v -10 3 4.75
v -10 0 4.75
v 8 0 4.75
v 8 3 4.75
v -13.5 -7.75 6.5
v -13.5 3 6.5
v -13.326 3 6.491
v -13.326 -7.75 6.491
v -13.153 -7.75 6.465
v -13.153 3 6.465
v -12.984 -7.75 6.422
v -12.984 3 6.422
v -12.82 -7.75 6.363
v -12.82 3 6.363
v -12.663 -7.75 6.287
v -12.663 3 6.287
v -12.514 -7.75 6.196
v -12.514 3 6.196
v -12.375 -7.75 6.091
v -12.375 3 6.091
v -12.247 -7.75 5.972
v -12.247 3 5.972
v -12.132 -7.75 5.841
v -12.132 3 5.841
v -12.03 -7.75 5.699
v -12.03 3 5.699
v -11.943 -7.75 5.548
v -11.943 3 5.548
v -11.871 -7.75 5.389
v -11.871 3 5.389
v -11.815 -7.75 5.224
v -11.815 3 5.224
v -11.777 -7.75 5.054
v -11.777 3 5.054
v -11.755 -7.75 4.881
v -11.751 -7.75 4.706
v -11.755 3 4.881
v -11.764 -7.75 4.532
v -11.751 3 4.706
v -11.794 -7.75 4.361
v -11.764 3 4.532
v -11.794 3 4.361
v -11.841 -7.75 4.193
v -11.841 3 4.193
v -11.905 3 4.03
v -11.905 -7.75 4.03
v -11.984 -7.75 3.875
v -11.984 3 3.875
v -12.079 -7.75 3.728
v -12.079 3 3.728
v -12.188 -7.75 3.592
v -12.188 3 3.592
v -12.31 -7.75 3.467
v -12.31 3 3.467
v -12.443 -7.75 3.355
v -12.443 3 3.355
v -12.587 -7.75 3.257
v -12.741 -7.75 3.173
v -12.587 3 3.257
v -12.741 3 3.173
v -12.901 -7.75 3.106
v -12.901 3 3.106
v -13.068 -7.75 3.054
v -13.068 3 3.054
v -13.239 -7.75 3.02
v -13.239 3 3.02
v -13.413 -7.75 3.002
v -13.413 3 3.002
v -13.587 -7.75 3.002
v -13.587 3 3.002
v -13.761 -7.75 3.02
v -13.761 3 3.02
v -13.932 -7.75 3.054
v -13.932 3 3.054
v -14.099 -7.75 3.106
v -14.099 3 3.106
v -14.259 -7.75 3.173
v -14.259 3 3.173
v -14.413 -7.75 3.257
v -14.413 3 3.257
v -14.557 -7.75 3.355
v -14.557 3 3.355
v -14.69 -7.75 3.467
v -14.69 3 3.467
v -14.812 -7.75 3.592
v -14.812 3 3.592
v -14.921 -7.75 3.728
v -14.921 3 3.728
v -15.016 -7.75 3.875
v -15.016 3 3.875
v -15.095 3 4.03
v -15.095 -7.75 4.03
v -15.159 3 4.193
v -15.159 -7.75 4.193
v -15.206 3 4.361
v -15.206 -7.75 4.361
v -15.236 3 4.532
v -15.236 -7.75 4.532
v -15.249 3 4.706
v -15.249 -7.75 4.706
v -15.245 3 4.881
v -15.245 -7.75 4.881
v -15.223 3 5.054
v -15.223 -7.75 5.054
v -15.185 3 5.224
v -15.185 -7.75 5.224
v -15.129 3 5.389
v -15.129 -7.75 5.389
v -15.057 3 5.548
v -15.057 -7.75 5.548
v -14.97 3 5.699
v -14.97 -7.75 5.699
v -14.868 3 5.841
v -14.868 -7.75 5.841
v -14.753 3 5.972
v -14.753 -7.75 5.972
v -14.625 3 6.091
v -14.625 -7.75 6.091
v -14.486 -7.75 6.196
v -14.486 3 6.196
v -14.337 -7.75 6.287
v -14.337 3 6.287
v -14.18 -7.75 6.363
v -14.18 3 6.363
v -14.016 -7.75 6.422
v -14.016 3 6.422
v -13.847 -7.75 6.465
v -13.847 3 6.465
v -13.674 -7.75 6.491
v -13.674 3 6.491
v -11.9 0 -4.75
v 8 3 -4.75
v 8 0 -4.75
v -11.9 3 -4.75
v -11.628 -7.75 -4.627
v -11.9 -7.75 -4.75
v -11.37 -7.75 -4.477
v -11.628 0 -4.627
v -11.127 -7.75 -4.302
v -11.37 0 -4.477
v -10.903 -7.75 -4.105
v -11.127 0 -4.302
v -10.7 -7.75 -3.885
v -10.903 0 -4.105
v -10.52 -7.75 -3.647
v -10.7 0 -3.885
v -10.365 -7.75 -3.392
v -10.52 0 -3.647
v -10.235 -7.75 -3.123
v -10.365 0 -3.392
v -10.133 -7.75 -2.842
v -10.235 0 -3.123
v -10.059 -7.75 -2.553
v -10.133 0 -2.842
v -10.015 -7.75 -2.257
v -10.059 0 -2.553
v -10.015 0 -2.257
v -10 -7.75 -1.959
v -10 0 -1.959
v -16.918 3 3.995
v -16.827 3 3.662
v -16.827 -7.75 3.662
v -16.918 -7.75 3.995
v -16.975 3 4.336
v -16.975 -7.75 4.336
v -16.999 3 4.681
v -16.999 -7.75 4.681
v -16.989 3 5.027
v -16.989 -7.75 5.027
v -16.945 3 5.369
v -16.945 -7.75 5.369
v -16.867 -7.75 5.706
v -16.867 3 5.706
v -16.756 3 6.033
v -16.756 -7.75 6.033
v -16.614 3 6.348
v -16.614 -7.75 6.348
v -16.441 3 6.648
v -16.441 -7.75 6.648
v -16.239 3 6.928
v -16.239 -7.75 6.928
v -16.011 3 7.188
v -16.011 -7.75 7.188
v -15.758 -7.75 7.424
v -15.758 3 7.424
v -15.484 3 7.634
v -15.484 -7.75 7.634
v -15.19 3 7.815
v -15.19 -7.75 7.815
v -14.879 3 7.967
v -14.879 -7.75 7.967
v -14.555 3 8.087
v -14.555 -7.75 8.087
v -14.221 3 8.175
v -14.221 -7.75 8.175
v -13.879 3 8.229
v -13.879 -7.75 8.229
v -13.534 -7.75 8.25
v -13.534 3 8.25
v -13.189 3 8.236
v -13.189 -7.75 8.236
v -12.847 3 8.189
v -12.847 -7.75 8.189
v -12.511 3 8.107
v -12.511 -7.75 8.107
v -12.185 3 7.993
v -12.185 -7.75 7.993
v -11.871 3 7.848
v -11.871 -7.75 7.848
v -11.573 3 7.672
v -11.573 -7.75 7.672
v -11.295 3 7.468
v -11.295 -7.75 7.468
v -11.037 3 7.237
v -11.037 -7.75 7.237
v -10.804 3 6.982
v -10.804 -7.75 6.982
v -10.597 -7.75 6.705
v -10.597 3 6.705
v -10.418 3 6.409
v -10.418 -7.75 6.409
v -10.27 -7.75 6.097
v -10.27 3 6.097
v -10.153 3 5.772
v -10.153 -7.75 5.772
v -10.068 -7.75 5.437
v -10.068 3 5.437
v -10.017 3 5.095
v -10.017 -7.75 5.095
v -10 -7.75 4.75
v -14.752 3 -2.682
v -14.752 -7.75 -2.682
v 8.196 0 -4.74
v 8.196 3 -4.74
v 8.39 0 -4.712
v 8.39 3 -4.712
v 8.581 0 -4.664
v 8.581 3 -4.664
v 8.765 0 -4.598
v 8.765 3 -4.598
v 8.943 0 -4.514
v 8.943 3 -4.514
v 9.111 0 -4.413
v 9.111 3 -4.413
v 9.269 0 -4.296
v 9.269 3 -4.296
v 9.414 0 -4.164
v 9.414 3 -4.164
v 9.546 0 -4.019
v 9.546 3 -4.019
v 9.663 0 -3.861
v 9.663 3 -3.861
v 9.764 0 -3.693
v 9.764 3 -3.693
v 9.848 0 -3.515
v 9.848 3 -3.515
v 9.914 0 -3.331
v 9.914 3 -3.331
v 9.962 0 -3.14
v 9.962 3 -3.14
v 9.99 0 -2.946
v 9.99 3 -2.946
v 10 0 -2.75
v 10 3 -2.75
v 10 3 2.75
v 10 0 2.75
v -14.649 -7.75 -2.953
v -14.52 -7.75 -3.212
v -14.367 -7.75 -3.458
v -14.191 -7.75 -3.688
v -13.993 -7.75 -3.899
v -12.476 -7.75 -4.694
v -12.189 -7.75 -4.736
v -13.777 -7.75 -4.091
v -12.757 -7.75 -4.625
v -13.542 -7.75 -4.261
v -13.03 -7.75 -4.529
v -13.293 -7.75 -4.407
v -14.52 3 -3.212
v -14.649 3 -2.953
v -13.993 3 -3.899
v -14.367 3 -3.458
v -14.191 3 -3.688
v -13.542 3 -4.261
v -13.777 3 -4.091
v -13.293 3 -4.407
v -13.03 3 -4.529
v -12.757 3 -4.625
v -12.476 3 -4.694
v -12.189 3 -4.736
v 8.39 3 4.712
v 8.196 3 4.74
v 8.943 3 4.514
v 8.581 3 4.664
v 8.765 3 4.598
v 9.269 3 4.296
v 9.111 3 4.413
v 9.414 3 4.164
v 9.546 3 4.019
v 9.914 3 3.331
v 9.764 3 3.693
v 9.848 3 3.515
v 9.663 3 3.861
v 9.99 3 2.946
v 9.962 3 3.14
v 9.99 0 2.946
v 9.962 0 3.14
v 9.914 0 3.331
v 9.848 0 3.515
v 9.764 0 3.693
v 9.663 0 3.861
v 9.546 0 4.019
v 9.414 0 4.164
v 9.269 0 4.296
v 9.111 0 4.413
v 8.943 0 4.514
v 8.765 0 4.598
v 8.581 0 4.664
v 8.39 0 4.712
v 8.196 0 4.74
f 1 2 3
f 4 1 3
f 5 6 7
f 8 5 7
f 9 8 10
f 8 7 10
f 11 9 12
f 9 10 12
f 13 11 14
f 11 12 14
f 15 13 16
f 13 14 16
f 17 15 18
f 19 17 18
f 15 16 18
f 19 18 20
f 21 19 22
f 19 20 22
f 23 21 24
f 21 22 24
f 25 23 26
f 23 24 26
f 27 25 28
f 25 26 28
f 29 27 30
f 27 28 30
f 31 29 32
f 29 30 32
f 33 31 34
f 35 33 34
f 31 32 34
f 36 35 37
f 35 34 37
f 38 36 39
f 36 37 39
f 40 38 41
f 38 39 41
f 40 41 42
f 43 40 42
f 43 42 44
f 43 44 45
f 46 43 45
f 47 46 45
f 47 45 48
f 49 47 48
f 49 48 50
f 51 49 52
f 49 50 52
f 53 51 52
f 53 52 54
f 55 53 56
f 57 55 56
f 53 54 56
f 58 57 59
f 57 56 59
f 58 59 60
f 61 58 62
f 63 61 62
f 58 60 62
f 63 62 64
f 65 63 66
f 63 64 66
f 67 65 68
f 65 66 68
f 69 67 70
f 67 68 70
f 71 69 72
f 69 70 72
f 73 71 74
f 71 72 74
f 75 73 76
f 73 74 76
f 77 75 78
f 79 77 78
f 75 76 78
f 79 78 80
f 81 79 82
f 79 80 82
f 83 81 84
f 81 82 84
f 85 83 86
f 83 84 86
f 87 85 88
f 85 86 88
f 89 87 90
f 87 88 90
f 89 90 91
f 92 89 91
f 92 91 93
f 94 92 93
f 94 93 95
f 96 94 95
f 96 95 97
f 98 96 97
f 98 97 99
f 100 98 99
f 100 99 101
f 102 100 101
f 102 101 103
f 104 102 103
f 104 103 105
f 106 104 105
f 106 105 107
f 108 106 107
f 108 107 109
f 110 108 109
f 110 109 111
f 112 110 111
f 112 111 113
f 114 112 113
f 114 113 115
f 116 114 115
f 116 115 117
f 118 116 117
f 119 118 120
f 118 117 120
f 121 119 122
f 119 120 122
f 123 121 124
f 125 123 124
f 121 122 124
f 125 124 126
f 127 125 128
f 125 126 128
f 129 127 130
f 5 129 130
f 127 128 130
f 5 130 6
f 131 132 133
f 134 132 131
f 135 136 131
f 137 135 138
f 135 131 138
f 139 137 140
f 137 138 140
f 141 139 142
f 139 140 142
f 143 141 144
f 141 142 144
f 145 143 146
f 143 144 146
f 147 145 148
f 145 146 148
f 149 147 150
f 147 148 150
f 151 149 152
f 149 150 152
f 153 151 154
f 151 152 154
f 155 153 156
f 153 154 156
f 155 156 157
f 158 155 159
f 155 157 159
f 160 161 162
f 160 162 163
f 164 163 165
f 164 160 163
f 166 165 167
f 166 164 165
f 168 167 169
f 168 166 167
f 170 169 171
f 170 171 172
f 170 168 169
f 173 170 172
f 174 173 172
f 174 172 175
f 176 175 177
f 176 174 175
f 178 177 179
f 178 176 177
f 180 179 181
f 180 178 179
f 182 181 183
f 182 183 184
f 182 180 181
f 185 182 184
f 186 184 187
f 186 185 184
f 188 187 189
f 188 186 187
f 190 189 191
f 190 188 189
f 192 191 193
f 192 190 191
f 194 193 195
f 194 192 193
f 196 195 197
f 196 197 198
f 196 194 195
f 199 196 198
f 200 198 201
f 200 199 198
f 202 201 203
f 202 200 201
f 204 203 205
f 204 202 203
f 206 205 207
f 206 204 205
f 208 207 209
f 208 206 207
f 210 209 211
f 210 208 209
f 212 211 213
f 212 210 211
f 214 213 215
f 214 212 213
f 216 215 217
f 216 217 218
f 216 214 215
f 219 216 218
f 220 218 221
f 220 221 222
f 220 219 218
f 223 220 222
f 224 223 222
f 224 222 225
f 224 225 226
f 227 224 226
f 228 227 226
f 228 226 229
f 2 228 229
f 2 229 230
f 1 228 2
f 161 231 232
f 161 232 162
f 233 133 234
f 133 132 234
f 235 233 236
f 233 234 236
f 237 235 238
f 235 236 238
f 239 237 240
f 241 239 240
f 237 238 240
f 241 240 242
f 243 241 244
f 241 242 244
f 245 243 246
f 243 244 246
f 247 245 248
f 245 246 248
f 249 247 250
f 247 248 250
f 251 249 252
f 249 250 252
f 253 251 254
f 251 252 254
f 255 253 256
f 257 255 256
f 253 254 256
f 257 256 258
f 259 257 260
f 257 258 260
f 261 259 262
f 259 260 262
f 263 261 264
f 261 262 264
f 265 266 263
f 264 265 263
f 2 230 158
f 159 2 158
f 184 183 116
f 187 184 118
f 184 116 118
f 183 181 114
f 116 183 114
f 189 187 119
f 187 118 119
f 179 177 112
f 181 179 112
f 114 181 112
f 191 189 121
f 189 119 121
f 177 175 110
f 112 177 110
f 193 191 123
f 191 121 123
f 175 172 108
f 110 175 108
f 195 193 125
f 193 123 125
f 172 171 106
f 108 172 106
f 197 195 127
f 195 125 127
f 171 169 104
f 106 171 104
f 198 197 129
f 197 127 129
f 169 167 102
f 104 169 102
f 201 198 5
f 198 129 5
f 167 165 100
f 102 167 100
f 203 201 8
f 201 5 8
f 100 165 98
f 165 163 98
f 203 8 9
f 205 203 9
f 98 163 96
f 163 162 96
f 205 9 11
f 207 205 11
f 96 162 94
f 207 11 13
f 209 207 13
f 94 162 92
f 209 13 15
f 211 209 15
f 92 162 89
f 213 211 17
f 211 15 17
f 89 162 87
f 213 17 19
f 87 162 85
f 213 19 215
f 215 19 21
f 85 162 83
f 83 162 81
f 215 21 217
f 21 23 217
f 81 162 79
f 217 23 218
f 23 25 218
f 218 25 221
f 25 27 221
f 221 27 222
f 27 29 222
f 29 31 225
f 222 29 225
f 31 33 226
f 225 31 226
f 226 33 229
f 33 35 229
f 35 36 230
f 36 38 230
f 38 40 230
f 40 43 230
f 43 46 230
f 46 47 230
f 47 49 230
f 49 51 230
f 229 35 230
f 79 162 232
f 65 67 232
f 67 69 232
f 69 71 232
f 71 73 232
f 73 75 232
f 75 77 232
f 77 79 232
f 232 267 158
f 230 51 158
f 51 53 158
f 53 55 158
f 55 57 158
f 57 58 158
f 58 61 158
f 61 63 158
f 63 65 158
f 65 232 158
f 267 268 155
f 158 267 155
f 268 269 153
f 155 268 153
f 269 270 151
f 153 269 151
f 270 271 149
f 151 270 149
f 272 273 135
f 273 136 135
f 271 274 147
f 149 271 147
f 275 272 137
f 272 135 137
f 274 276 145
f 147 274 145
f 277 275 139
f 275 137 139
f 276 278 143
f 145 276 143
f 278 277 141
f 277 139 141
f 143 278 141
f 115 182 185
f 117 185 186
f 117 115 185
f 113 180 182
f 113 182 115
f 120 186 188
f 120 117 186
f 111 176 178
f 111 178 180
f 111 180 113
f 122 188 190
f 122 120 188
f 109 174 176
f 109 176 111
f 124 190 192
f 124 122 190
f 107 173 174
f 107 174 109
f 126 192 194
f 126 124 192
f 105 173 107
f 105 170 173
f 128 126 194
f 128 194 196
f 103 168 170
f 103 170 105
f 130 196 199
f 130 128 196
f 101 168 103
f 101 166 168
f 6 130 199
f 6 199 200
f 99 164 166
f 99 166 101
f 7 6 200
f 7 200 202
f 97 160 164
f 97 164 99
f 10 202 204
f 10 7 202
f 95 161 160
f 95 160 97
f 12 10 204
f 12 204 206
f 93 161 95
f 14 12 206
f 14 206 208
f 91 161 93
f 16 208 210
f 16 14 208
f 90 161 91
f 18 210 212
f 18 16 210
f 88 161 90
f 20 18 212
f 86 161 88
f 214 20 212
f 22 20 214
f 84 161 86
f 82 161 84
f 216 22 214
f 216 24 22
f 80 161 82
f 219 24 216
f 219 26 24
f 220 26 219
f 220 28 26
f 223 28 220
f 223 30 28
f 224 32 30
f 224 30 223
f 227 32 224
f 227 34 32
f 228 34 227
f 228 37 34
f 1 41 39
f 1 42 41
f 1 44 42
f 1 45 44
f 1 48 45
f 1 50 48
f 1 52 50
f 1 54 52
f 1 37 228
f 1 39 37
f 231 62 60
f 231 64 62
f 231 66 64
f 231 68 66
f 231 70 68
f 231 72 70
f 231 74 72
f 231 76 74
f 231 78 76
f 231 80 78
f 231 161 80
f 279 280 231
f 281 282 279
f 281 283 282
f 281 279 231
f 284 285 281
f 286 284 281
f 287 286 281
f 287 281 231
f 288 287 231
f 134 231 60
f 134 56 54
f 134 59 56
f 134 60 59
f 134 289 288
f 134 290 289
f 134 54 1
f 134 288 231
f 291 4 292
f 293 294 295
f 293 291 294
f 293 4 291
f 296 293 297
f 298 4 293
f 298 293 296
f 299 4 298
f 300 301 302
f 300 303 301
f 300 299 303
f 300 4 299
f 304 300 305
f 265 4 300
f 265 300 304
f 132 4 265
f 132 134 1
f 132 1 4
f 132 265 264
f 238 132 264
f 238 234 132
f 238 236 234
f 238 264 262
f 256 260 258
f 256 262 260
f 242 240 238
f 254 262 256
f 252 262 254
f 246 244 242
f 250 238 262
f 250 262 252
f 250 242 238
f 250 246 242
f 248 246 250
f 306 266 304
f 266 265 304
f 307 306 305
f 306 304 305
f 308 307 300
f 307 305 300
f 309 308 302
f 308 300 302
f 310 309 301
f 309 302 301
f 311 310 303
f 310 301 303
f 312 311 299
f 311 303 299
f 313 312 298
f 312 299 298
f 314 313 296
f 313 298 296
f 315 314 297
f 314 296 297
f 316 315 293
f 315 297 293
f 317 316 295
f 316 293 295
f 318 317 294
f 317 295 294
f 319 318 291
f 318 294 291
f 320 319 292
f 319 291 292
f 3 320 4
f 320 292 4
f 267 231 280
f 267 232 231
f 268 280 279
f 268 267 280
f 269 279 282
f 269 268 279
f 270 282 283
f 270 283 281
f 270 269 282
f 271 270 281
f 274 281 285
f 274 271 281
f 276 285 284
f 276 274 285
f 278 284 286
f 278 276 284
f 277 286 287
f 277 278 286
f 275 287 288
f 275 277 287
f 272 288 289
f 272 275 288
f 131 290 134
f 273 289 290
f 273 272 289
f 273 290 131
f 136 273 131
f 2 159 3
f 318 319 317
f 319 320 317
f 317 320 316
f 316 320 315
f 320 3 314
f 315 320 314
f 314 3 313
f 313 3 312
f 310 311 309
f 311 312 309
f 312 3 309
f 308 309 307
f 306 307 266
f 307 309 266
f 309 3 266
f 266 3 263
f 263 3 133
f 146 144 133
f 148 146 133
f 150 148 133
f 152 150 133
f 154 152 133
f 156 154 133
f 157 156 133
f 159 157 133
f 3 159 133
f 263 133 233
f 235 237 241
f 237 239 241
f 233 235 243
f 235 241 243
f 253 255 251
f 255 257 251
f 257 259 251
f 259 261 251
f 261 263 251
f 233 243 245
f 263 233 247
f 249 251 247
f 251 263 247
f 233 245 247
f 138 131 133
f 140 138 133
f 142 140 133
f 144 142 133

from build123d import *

# Parameters (mm, degrees)
SKETCH1_W           = 20
SKETCH1_H           = 9.5
BOSS_EXTRUDE1_DEPTH = 3
SKETCH2_R           = 1.75
BOSS_EXTRUDE2_DEPTH = 10.75
FILLET1_R           = 3
FILLET2_R           = 3
FILLET3_R           = 2


with BuildPart() as part:
    # Sketch1 → Boss-Extrude1 (new body)
    with BuildSketch(Plane(origin=(0, 0, 0), x_dir=(1, 0, 0), z_dir=(0, 1, 0))):
        Rectangle(SKETCH1_W, SKETCH1_H)
    extrude(amount=BOSS_EXTRUDE1_DEPTH)

    # Sketch2 → Boss-Extrude2 (add)
    with BuildSketch(Plane(origin=(0, 3, 0), x_dir=(1, 0, 0), z_dir=(0, 1, 0))):
        with BuildLine():
            Line((-14.075613498, 4.75), (-16.826627584, -3.662089657))
            ThreePointArc((-16.826627584, -3.662089657), (-14.050819142, -8.206385145), (-10, -4.75))
            Line((-10, -4.75), (-10, 4.75))
            Line((-10, 4.75), (-14.075613498, 4.75))
        make_face()
        with Locations(Location((-13.5, -4.75, 0), (0, 0, 270))):
            Circle(SKETCH2_R, mode=Mode.SUBTRACT)
    extrude(amount=-BOSS_EXTRUDE2_DEPTH)

    # Fillet1
    fillet1_edges = [part.edges().sort_by_distance(p)[0] for p in [
        (-14.075613498, -2.375, -4.75),
    ]]
    fillet(fillet1_edges, radius=FILLET1_R)

    # Fillet2
    # the kernel refuses this fillet: 3 mm, written as the material it takes off along each edge
    with BuildSketch(Plane(origin=(-10, 0, -4.75), x_dir=(-1, 0, 0), z_dir=(0, -1, 0))) as fillet2_piece_1:
        with BuildLine():
            CenterArc((3, -2.791197737), FILLET2_R, 111.502864163, 68.497135837)
            Line((0, -2.791197737), (0, 0))
            Line((0, 0), (1.900356789, 0))
        make_face()
    extrude(amount=14.727994343, mode=Mode.SUBTRACT)

    # Fillet3
    fillet3_edges = [part.edges().sort_by_distance(p)[0] for p in [
        (10, 1.5, 4.75),
        (10, 1.5, -4.75),
    ]]
    fillet(fillet3_edges, radius=FILLET3_R)


solid = part.part
